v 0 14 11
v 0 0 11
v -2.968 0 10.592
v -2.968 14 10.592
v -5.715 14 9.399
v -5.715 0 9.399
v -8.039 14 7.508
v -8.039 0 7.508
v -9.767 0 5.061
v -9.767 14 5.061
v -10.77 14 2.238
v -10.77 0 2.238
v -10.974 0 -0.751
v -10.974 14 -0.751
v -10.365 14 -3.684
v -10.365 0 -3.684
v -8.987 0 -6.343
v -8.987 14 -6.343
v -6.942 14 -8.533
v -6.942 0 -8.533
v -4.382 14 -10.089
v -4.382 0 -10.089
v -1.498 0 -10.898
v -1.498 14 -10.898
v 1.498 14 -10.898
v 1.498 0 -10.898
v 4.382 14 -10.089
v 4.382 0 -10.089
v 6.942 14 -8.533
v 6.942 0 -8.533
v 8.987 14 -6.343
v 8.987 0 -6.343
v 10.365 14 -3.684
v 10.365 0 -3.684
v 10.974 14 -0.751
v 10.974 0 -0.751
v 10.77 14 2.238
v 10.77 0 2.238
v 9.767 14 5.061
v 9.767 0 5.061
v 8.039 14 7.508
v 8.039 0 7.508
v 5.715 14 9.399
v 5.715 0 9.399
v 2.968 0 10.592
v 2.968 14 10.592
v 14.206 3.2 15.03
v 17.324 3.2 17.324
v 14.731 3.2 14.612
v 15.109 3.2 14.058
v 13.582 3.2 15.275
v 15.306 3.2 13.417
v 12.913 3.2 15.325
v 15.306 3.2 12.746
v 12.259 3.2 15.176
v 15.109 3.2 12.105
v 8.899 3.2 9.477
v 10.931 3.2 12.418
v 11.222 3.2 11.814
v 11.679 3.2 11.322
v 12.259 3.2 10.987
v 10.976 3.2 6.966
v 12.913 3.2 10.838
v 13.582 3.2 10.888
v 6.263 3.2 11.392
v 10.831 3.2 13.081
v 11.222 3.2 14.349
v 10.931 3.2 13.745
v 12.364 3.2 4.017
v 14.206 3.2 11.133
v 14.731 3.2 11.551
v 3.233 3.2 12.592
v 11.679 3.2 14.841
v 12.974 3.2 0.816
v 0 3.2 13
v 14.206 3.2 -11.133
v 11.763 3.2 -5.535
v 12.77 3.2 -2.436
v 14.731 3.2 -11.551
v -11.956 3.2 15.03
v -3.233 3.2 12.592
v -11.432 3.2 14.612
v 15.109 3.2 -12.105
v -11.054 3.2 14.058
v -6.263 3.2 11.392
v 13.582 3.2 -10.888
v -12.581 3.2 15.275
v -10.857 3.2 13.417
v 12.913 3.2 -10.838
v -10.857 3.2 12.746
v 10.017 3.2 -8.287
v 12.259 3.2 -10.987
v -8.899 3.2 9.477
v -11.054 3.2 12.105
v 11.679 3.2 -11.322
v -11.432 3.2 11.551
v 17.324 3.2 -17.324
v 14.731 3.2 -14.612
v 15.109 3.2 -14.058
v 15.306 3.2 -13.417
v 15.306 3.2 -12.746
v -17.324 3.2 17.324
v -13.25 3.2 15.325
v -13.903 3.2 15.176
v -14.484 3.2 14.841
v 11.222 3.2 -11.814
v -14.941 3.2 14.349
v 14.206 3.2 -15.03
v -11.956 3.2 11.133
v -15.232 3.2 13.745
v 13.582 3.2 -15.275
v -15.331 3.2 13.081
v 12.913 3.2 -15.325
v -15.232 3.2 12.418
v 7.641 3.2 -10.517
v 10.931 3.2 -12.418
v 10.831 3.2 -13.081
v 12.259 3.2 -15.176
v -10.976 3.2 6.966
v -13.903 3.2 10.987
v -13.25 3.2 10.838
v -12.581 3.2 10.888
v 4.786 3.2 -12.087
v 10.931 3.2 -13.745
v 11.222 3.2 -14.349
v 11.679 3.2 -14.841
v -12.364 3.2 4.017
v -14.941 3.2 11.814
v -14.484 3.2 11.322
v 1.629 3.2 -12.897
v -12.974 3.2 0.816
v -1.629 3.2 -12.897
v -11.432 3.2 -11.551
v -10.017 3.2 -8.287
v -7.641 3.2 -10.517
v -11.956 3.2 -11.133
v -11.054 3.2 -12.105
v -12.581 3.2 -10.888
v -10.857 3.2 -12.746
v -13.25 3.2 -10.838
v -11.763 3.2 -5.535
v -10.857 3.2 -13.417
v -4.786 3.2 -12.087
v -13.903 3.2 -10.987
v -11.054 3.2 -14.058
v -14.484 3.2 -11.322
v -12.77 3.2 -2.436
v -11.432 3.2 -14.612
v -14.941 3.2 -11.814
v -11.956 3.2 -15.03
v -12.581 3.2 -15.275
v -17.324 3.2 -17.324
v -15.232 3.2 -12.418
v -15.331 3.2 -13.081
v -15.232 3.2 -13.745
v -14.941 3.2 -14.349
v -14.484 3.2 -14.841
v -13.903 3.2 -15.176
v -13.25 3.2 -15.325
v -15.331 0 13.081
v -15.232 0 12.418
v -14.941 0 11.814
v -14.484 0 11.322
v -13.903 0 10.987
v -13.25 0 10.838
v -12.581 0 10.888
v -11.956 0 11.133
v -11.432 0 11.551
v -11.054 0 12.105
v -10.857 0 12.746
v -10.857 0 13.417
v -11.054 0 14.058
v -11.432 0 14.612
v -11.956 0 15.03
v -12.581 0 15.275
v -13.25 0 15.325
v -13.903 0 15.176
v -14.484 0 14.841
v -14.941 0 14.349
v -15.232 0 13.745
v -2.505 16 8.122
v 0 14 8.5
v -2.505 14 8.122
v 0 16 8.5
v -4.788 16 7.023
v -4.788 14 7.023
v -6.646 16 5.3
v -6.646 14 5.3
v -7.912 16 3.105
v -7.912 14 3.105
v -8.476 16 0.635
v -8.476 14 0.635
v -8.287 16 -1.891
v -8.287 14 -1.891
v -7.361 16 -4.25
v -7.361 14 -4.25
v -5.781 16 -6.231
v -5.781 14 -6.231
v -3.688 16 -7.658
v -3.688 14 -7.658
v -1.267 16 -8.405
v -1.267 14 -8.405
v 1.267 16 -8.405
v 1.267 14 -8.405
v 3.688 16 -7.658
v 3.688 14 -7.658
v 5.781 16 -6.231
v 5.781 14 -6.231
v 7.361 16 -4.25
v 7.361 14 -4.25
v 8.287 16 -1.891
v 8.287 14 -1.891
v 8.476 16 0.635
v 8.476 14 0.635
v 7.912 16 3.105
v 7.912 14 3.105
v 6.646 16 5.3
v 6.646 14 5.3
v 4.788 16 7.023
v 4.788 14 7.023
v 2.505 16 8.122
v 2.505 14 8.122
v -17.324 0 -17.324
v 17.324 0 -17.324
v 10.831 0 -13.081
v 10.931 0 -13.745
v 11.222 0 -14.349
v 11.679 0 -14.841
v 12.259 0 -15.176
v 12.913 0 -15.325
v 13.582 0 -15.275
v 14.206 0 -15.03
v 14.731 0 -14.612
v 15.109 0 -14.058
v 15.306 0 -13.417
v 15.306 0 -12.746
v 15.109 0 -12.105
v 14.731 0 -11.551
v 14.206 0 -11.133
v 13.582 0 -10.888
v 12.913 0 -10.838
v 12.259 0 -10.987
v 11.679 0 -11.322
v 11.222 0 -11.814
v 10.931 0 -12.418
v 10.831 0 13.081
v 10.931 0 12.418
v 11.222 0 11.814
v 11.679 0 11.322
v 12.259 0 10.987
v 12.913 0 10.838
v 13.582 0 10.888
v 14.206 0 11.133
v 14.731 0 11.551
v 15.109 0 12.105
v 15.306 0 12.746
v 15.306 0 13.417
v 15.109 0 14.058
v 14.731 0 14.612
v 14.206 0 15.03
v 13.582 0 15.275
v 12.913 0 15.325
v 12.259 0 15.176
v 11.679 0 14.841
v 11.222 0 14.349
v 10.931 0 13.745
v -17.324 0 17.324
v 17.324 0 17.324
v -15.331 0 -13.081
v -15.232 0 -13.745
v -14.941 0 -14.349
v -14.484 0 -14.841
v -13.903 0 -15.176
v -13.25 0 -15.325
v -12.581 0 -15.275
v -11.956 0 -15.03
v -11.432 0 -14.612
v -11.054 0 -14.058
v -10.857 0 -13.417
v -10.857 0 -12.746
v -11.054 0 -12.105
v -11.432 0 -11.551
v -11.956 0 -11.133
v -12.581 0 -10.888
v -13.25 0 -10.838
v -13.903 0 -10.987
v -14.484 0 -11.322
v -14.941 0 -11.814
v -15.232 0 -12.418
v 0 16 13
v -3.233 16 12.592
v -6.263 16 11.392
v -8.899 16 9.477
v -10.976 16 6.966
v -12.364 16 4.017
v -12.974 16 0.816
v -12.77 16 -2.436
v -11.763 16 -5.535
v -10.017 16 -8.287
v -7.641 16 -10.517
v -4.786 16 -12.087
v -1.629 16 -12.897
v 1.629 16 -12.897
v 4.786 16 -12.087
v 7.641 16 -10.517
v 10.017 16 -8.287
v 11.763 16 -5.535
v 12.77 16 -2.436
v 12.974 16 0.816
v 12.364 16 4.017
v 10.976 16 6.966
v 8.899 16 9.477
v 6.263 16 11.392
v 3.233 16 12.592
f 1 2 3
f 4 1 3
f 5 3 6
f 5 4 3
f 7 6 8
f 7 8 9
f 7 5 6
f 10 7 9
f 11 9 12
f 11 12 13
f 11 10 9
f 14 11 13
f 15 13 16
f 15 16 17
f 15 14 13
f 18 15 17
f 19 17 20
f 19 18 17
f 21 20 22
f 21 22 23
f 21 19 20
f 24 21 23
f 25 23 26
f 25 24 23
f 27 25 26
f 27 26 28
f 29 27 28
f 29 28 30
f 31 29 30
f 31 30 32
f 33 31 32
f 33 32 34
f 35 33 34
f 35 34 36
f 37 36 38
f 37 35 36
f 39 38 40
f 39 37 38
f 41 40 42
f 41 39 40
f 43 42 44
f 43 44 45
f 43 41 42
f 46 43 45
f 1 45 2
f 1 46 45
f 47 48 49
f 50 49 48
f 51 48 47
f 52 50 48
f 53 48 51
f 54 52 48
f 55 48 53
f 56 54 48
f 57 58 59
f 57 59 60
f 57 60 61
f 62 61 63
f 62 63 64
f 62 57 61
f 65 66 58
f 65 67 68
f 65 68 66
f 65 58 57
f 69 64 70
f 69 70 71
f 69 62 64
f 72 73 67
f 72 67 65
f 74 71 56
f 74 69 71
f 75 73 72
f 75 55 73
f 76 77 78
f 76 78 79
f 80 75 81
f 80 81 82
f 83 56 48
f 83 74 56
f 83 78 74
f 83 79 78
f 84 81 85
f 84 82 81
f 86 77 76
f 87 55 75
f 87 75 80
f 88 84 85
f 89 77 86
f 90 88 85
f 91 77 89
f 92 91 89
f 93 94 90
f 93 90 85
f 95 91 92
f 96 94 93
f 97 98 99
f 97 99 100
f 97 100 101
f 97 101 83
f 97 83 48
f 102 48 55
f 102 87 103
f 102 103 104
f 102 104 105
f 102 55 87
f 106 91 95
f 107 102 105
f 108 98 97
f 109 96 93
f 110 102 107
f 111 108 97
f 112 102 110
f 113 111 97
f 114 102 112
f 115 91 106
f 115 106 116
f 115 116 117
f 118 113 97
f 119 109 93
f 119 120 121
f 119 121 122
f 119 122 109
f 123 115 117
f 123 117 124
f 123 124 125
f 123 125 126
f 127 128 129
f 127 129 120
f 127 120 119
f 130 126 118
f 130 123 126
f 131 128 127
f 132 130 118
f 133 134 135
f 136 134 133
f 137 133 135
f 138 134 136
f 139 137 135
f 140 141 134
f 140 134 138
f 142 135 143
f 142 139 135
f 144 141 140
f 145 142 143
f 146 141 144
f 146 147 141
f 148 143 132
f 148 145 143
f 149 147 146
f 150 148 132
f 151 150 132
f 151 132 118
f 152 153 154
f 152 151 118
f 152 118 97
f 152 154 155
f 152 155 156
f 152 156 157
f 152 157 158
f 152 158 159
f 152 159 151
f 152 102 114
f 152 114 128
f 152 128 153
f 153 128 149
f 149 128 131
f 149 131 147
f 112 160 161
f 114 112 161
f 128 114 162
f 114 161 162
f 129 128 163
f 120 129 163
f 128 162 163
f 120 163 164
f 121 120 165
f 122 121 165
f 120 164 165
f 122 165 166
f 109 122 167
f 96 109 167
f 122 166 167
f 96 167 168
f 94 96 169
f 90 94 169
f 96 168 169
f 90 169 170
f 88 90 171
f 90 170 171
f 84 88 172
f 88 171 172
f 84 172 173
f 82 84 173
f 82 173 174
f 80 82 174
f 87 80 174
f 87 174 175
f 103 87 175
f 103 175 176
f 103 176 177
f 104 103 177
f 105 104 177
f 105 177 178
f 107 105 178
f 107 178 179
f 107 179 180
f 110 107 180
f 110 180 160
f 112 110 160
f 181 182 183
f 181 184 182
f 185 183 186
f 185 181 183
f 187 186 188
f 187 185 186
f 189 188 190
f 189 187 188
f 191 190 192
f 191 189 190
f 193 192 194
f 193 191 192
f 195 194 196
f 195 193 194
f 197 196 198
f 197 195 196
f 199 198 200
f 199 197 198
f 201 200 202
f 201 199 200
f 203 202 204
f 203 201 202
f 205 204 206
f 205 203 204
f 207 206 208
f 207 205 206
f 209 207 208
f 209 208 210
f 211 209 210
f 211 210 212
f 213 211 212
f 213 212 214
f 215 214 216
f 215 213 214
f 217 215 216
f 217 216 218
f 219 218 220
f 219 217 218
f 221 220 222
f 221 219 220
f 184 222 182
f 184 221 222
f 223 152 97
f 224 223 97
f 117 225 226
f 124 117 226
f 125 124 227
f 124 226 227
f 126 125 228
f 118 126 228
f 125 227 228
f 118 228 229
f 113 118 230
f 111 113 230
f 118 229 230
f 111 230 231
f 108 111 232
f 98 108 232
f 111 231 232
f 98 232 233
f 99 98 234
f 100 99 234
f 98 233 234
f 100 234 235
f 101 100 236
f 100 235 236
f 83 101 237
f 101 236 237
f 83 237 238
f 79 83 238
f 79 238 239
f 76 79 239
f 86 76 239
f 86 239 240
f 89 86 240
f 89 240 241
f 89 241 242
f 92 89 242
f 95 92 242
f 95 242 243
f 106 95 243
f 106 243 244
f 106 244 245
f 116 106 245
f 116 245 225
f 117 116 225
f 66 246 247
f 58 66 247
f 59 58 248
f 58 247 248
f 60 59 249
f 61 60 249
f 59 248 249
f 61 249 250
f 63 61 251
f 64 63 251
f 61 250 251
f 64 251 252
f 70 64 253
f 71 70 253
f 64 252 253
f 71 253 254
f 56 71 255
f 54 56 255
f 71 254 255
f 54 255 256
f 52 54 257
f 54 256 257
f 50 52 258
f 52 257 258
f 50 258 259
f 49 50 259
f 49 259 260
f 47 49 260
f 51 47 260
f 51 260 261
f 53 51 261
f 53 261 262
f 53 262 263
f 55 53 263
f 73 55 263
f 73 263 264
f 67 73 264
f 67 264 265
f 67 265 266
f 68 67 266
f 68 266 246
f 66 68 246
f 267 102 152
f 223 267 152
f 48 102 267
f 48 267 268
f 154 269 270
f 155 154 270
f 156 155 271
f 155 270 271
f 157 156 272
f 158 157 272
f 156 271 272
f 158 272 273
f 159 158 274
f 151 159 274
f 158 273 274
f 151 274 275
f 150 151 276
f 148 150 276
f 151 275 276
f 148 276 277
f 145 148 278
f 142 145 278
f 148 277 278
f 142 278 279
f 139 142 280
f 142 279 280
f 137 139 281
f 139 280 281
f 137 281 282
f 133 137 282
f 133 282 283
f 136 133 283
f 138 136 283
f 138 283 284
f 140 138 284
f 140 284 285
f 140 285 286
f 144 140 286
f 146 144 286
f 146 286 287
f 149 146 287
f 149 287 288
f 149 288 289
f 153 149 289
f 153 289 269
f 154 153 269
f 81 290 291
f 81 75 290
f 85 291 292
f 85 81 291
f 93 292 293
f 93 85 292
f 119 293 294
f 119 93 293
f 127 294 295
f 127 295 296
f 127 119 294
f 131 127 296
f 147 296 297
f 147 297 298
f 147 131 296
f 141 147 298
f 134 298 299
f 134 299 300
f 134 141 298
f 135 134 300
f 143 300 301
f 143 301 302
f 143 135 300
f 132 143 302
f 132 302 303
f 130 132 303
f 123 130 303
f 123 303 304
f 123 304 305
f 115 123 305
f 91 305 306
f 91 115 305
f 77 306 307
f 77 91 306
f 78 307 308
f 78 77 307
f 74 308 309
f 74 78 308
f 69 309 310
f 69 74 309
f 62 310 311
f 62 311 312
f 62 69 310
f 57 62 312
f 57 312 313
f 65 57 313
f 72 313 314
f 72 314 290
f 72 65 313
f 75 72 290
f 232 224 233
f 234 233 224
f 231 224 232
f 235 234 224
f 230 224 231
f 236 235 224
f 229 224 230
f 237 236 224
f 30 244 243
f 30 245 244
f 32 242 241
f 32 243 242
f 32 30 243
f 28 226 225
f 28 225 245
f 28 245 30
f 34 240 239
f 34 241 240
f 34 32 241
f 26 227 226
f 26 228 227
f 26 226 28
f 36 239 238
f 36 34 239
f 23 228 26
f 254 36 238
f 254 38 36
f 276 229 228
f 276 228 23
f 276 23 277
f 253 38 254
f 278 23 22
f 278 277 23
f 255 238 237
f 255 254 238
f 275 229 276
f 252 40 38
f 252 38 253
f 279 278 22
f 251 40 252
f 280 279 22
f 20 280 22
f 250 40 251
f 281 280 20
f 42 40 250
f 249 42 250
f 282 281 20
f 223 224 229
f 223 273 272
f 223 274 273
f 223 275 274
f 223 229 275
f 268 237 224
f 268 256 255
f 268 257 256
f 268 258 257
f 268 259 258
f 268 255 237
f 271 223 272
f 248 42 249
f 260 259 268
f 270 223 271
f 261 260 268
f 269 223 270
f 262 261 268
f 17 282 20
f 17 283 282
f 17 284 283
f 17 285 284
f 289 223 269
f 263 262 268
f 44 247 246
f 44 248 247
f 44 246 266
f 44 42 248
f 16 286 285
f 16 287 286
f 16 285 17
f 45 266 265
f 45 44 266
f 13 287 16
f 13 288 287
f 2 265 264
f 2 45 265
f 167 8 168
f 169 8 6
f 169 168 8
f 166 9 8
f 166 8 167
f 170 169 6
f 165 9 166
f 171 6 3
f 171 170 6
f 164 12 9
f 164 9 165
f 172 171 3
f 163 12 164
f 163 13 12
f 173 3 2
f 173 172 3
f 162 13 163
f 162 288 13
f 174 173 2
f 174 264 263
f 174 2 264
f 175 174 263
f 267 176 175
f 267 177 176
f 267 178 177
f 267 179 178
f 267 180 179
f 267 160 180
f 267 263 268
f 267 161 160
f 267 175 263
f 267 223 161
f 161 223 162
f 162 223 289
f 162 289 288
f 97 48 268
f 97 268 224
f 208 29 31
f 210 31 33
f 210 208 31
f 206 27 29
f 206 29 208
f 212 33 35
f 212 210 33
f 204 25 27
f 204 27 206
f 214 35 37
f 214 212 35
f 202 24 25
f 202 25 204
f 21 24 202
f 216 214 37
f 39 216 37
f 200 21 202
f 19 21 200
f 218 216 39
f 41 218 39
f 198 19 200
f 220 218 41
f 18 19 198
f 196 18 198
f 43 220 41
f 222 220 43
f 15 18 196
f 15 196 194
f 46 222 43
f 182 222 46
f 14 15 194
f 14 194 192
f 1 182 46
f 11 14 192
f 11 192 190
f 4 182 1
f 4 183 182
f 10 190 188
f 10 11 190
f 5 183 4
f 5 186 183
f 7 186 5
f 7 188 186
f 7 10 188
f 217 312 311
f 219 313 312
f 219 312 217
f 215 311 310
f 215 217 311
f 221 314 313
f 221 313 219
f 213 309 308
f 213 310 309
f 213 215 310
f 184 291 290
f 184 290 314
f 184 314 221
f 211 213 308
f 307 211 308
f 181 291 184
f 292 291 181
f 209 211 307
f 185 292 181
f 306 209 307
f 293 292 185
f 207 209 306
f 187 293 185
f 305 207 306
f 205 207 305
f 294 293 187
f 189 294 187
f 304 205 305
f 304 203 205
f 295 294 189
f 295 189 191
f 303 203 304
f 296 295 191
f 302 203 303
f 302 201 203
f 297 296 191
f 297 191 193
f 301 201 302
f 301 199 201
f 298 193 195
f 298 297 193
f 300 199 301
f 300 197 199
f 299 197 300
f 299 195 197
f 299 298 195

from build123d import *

# Parameters (mm, degrees)
M4_CLEARANCE_HOLE1_D = 4.5
SKETCH5_W            = 85.847558644
SKETCH5_H            = 65.066287946
SKETCH5_W_2          = 34.648232278
SKETCH5_H_2          = 34.648232278
CUT_EXTRUDE2_DEPTH   = 10


with BuildPart() as part:
    # Sketch1 → Revolve1 (revolve)
    with BuildSketch(Plane.XY):
        Polygon((-24.5, 0), (-11, 0), (-11, 14), (-8.5, 14), (-8.5, 16), (-13, 16), (-13, 3.2), (-24.5, 3.2), align=None)
    revolve(axis=Axis((0, 31.465116279, 0), (0, -1, 0)))

    # M4 Clearance Hole1 (through all)
    with Locations(Plane(origin=(0, 3.2, 0), x_dir=(1, 0, 0), z_dir=(0, 1, 0))):
        with Locations((-13.081475452, -13.081475452), (-13.081475452, 13.081475452), (13.081475452, 13.081475452), (13.081475452, -13.081475452)):
            Hole(M4_CLEARANCE_HOLE1_D / 2)

    # Sketch5 → Cut-Extrude2 (cut)
    with BuildSketch(Plane(origin=(0, 3.2, 0), x_dir=(1, 0, 0), z_dir=(0, 1, 0))):
        Rectangle(SKETCH5_W, SKETCH5_H)
        Rectangle(SKETCH5_W_2, SKETCH5_H_2, mode=Mode.SUBTRACT)
    extrude(amount=-CUT_EXTRUDE2_DEPTH, mode=Mode.SUBTRACT)


solid = part.part
